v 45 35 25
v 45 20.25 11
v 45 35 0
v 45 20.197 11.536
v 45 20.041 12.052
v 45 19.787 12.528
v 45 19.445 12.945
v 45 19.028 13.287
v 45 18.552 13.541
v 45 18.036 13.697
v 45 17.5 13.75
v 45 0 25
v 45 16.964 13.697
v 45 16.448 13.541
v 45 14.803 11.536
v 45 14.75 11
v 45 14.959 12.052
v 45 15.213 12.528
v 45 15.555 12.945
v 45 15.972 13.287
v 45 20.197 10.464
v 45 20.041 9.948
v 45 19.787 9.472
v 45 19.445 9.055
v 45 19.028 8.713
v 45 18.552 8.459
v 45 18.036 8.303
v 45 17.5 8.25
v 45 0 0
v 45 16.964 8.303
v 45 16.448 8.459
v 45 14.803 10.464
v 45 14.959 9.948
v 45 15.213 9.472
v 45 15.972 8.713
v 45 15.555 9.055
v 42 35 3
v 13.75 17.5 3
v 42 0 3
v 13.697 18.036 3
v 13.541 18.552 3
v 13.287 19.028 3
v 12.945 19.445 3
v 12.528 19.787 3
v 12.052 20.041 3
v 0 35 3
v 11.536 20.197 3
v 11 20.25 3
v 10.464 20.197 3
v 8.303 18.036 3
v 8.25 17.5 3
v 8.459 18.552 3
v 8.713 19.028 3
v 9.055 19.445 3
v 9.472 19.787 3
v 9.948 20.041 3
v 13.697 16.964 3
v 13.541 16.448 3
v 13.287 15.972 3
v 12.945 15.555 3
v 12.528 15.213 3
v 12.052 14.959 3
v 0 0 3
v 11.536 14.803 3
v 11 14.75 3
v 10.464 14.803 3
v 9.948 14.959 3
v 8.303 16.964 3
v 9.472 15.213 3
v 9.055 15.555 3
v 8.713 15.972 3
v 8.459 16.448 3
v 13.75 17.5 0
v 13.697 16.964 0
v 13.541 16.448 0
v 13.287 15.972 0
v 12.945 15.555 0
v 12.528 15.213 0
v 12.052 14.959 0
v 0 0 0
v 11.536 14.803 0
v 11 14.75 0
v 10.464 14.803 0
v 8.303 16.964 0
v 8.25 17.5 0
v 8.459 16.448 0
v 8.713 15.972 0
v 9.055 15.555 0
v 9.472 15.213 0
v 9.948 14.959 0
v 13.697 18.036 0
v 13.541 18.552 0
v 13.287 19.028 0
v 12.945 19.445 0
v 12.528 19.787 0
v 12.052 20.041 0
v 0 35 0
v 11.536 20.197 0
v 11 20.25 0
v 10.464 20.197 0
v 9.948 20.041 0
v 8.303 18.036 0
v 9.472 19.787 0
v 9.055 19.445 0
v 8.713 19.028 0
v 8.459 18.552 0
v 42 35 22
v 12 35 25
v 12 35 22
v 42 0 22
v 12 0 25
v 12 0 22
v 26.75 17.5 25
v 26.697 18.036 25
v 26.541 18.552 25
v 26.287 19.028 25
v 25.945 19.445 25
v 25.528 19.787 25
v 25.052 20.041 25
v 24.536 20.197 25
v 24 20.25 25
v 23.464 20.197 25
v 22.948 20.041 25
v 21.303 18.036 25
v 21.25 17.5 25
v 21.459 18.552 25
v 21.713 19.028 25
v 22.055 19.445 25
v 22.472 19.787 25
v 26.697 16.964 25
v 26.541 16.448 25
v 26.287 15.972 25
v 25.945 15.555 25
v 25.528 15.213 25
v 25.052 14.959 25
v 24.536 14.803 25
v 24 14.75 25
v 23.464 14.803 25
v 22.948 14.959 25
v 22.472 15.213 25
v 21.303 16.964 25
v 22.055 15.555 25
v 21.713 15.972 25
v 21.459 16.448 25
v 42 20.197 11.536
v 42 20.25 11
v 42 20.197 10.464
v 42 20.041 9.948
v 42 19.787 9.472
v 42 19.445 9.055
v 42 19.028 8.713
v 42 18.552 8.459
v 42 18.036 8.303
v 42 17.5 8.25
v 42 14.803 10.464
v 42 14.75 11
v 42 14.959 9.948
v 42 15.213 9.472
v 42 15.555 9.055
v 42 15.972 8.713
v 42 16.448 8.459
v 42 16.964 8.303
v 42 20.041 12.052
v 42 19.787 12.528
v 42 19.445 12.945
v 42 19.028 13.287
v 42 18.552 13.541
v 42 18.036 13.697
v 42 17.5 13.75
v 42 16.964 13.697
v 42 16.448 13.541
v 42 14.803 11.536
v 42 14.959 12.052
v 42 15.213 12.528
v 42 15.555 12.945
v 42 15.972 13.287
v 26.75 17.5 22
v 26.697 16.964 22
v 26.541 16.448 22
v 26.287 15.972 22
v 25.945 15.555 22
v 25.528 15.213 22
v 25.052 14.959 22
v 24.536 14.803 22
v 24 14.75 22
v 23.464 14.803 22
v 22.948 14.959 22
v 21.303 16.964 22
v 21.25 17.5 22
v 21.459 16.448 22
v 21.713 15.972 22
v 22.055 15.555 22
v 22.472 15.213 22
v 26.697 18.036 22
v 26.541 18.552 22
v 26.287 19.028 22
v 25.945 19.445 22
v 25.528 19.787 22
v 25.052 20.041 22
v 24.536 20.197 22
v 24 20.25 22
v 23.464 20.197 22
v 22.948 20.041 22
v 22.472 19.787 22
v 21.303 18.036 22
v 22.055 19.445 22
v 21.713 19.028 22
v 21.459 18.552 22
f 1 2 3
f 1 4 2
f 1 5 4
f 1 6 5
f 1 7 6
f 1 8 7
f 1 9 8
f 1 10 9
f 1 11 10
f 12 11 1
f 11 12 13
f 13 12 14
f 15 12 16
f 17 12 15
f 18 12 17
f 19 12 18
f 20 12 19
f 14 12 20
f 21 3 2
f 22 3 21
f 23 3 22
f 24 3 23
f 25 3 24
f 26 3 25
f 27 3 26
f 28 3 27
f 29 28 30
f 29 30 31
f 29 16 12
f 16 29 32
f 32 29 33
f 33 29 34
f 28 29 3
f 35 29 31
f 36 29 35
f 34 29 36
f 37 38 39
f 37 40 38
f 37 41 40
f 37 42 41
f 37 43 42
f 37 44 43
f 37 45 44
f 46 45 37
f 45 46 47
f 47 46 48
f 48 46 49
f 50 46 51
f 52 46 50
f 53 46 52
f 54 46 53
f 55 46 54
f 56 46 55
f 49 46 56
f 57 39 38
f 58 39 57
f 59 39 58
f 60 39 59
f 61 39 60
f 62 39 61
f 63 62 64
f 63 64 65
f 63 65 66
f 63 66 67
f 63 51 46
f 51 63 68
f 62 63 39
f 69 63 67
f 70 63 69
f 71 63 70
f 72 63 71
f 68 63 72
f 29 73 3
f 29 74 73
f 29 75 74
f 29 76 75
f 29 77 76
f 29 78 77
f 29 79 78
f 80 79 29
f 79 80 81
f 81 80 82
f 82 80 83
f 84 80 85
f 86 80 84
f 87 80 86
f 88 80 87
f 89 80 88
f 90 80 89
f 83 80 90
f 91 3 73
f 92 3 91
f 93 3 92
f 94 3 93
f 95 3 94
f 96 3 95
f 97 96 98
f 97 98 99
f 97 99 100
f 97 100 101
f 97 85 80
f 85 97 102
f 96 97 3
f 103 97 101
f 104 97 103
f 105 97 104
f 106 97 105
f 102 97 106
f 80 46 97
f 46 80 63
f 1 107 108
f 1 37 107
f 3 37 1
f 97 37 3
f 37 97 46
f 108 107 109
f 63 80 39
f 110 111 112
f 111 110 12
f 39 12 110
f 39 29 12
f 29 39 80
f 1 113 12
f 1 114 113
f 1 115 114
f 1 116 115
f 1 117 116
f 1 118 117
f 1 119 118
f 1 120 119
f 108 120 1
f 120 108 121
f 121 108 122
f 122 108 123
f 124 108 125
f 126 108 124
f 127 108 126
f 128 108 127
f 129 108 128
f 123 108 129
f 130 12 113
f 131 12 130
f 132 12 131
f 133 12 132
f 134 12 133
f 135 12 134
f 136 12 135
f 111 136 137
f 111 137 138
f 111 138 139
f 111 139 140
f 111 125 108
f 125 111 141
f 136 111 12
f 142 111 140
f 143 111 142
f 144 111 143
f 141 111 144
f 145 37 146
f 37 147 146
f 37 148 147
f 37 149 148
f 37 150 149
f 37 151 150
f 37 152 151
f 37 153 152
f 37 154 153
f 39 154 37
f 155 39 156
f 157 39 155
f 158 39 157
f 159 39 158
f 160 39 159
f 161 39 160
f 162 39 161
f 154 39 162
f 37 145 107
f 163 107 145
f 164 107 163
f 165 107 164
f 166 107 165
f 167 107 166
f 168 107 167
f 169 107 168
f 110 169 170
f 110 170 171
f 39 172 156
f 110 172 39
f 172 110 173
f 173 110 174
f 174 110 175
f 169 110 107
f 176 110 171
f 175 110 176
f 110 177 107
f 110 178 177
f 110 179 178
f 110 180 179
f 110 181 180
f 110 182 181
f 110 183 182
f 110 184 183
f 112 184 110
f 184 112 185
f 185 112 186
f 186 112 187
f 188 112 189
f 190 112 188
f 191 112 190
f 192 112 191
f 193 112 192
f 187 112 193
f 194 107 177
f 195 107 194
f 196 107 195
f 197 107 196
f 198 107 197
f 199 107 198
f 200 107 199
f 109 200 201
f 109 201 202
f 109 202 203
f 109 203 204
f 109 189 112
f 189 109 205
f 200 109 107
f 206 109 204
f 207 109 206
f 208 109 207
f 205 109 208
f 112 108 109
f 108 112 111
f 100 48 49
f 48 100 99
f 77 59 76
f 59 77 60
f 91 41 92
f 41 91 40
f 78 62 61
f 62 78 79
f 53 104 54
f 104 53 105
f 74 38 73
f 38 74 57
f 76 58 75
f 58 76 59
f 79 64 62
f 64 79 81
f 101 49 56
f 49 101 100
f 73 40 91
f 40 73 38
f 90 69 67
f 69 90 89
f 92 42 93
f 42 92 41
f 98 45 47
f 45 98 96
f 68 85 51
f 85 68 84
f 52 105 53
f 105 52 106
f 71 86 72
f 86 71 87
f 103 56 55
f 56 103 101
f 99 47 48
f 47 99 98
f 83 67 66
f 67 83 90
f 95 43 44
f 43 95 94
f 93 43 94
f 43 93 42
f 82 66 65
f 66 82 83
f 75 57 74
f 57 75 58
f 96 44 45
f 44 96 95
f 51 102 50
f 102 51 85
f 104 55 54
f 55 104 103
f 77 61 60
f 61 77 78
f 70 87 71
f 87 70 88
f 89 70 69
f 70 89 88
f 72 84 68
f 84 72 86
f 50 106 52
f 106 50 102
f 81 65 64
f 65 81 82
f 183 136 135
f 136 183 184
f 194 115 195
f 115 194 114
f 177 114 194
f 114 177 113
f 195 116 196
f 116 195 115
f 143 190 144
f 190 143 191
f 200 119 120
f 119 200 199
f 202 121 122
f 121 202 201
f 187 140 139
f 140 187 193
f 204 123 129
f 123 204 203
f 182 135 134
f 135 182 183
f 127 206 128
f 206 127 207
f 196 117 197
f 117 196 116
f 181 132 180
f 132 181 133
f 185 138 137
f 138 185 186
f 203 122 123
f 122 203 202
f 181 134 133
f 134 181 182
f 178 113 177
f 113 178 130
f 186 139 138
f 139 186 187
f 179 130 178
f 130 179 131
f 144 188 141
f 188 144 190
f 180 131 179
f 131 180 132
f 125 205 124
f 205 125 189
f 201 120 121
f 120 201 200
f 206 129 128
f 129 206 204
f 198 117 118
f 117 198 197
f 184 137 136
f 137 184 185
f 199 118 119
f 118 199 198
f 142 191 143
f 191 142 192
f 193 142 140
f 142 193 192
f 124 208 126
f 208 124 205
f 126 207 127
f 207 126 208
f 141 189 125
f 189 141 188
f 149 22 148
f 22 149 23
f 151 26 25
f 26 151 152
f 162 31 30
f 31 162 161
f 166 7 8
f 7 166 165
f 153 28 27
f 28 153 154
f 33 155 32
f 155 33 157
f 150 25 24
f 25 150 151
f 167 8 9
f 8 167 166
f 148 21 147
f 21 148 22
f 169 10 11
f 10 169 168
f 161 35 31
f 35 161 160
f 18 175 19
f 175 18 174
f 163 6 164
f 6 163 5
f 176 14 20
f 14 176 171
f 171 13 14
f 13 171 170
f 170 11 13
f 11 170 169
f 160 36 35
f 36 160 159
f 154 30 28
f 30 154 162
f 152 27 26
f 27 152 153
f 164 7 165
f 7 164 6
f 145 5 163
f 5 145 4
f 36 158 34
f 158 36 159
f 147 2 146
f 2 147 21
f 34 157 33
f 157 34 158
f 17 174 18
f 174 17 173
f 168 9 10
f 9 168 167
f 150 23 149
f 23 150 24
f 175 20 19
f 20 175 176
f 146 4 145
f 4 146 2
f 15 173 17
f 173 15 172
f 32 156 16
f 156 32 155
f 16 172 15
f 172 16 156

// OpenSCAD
$fn = 32;

// ----------------------------------------------------------------------
// Z-bracket: 45 x 35 x 25 mm
// ----------------------------------------------------------------------

// --- parameters (mm) ---
lower_leg = 45;           // lower foot length, X
upper_leg = 30;           // upper foot length, X
bracket_w = 35;           // bracket width, Y
offset_h = 25;            // overall rise, Z
sheet_t = 3;              // plate thickness
hole_d = 5.5;             // clearance for M5

module hole_z(px, py, z0) {
  translate([px, py, z0 - 0.5]) cylinder(h = sheet_t + 1, d = hole_d);
}
module hole_x(py, pz) {
  translate([-0.5, py, pz]) rotate([0, 90, 0]) cylinder(h = sheet_t + 1, d = hole_d);
}

difference() {
  union() {
    cube([lower_leg, bracket_w, sheet_t]);
    /* web, overlapping the lower foot */
    translate([lower_leg - sheet_t, 0, 0]) cube([sheet_t, bracket_w, offset_h]);
    /* upper foot, sunk into the web */
    translate([lower_leg - sheet_t - upper_leg, 0, offset_h - sheet_t]) cube([upper_leg + sheet_t, bracket_w, sheet_t]);
  }
  hole_z(11, 17.5, 0);
  translate([lower_leg - sheet_t - 18, 0, 0]) hole_z(0, 17.5, offset_h - sheet_t);
  translate([lower_leg - sheet_t, 0, 0]) hole_x(17.5, 11);
}
